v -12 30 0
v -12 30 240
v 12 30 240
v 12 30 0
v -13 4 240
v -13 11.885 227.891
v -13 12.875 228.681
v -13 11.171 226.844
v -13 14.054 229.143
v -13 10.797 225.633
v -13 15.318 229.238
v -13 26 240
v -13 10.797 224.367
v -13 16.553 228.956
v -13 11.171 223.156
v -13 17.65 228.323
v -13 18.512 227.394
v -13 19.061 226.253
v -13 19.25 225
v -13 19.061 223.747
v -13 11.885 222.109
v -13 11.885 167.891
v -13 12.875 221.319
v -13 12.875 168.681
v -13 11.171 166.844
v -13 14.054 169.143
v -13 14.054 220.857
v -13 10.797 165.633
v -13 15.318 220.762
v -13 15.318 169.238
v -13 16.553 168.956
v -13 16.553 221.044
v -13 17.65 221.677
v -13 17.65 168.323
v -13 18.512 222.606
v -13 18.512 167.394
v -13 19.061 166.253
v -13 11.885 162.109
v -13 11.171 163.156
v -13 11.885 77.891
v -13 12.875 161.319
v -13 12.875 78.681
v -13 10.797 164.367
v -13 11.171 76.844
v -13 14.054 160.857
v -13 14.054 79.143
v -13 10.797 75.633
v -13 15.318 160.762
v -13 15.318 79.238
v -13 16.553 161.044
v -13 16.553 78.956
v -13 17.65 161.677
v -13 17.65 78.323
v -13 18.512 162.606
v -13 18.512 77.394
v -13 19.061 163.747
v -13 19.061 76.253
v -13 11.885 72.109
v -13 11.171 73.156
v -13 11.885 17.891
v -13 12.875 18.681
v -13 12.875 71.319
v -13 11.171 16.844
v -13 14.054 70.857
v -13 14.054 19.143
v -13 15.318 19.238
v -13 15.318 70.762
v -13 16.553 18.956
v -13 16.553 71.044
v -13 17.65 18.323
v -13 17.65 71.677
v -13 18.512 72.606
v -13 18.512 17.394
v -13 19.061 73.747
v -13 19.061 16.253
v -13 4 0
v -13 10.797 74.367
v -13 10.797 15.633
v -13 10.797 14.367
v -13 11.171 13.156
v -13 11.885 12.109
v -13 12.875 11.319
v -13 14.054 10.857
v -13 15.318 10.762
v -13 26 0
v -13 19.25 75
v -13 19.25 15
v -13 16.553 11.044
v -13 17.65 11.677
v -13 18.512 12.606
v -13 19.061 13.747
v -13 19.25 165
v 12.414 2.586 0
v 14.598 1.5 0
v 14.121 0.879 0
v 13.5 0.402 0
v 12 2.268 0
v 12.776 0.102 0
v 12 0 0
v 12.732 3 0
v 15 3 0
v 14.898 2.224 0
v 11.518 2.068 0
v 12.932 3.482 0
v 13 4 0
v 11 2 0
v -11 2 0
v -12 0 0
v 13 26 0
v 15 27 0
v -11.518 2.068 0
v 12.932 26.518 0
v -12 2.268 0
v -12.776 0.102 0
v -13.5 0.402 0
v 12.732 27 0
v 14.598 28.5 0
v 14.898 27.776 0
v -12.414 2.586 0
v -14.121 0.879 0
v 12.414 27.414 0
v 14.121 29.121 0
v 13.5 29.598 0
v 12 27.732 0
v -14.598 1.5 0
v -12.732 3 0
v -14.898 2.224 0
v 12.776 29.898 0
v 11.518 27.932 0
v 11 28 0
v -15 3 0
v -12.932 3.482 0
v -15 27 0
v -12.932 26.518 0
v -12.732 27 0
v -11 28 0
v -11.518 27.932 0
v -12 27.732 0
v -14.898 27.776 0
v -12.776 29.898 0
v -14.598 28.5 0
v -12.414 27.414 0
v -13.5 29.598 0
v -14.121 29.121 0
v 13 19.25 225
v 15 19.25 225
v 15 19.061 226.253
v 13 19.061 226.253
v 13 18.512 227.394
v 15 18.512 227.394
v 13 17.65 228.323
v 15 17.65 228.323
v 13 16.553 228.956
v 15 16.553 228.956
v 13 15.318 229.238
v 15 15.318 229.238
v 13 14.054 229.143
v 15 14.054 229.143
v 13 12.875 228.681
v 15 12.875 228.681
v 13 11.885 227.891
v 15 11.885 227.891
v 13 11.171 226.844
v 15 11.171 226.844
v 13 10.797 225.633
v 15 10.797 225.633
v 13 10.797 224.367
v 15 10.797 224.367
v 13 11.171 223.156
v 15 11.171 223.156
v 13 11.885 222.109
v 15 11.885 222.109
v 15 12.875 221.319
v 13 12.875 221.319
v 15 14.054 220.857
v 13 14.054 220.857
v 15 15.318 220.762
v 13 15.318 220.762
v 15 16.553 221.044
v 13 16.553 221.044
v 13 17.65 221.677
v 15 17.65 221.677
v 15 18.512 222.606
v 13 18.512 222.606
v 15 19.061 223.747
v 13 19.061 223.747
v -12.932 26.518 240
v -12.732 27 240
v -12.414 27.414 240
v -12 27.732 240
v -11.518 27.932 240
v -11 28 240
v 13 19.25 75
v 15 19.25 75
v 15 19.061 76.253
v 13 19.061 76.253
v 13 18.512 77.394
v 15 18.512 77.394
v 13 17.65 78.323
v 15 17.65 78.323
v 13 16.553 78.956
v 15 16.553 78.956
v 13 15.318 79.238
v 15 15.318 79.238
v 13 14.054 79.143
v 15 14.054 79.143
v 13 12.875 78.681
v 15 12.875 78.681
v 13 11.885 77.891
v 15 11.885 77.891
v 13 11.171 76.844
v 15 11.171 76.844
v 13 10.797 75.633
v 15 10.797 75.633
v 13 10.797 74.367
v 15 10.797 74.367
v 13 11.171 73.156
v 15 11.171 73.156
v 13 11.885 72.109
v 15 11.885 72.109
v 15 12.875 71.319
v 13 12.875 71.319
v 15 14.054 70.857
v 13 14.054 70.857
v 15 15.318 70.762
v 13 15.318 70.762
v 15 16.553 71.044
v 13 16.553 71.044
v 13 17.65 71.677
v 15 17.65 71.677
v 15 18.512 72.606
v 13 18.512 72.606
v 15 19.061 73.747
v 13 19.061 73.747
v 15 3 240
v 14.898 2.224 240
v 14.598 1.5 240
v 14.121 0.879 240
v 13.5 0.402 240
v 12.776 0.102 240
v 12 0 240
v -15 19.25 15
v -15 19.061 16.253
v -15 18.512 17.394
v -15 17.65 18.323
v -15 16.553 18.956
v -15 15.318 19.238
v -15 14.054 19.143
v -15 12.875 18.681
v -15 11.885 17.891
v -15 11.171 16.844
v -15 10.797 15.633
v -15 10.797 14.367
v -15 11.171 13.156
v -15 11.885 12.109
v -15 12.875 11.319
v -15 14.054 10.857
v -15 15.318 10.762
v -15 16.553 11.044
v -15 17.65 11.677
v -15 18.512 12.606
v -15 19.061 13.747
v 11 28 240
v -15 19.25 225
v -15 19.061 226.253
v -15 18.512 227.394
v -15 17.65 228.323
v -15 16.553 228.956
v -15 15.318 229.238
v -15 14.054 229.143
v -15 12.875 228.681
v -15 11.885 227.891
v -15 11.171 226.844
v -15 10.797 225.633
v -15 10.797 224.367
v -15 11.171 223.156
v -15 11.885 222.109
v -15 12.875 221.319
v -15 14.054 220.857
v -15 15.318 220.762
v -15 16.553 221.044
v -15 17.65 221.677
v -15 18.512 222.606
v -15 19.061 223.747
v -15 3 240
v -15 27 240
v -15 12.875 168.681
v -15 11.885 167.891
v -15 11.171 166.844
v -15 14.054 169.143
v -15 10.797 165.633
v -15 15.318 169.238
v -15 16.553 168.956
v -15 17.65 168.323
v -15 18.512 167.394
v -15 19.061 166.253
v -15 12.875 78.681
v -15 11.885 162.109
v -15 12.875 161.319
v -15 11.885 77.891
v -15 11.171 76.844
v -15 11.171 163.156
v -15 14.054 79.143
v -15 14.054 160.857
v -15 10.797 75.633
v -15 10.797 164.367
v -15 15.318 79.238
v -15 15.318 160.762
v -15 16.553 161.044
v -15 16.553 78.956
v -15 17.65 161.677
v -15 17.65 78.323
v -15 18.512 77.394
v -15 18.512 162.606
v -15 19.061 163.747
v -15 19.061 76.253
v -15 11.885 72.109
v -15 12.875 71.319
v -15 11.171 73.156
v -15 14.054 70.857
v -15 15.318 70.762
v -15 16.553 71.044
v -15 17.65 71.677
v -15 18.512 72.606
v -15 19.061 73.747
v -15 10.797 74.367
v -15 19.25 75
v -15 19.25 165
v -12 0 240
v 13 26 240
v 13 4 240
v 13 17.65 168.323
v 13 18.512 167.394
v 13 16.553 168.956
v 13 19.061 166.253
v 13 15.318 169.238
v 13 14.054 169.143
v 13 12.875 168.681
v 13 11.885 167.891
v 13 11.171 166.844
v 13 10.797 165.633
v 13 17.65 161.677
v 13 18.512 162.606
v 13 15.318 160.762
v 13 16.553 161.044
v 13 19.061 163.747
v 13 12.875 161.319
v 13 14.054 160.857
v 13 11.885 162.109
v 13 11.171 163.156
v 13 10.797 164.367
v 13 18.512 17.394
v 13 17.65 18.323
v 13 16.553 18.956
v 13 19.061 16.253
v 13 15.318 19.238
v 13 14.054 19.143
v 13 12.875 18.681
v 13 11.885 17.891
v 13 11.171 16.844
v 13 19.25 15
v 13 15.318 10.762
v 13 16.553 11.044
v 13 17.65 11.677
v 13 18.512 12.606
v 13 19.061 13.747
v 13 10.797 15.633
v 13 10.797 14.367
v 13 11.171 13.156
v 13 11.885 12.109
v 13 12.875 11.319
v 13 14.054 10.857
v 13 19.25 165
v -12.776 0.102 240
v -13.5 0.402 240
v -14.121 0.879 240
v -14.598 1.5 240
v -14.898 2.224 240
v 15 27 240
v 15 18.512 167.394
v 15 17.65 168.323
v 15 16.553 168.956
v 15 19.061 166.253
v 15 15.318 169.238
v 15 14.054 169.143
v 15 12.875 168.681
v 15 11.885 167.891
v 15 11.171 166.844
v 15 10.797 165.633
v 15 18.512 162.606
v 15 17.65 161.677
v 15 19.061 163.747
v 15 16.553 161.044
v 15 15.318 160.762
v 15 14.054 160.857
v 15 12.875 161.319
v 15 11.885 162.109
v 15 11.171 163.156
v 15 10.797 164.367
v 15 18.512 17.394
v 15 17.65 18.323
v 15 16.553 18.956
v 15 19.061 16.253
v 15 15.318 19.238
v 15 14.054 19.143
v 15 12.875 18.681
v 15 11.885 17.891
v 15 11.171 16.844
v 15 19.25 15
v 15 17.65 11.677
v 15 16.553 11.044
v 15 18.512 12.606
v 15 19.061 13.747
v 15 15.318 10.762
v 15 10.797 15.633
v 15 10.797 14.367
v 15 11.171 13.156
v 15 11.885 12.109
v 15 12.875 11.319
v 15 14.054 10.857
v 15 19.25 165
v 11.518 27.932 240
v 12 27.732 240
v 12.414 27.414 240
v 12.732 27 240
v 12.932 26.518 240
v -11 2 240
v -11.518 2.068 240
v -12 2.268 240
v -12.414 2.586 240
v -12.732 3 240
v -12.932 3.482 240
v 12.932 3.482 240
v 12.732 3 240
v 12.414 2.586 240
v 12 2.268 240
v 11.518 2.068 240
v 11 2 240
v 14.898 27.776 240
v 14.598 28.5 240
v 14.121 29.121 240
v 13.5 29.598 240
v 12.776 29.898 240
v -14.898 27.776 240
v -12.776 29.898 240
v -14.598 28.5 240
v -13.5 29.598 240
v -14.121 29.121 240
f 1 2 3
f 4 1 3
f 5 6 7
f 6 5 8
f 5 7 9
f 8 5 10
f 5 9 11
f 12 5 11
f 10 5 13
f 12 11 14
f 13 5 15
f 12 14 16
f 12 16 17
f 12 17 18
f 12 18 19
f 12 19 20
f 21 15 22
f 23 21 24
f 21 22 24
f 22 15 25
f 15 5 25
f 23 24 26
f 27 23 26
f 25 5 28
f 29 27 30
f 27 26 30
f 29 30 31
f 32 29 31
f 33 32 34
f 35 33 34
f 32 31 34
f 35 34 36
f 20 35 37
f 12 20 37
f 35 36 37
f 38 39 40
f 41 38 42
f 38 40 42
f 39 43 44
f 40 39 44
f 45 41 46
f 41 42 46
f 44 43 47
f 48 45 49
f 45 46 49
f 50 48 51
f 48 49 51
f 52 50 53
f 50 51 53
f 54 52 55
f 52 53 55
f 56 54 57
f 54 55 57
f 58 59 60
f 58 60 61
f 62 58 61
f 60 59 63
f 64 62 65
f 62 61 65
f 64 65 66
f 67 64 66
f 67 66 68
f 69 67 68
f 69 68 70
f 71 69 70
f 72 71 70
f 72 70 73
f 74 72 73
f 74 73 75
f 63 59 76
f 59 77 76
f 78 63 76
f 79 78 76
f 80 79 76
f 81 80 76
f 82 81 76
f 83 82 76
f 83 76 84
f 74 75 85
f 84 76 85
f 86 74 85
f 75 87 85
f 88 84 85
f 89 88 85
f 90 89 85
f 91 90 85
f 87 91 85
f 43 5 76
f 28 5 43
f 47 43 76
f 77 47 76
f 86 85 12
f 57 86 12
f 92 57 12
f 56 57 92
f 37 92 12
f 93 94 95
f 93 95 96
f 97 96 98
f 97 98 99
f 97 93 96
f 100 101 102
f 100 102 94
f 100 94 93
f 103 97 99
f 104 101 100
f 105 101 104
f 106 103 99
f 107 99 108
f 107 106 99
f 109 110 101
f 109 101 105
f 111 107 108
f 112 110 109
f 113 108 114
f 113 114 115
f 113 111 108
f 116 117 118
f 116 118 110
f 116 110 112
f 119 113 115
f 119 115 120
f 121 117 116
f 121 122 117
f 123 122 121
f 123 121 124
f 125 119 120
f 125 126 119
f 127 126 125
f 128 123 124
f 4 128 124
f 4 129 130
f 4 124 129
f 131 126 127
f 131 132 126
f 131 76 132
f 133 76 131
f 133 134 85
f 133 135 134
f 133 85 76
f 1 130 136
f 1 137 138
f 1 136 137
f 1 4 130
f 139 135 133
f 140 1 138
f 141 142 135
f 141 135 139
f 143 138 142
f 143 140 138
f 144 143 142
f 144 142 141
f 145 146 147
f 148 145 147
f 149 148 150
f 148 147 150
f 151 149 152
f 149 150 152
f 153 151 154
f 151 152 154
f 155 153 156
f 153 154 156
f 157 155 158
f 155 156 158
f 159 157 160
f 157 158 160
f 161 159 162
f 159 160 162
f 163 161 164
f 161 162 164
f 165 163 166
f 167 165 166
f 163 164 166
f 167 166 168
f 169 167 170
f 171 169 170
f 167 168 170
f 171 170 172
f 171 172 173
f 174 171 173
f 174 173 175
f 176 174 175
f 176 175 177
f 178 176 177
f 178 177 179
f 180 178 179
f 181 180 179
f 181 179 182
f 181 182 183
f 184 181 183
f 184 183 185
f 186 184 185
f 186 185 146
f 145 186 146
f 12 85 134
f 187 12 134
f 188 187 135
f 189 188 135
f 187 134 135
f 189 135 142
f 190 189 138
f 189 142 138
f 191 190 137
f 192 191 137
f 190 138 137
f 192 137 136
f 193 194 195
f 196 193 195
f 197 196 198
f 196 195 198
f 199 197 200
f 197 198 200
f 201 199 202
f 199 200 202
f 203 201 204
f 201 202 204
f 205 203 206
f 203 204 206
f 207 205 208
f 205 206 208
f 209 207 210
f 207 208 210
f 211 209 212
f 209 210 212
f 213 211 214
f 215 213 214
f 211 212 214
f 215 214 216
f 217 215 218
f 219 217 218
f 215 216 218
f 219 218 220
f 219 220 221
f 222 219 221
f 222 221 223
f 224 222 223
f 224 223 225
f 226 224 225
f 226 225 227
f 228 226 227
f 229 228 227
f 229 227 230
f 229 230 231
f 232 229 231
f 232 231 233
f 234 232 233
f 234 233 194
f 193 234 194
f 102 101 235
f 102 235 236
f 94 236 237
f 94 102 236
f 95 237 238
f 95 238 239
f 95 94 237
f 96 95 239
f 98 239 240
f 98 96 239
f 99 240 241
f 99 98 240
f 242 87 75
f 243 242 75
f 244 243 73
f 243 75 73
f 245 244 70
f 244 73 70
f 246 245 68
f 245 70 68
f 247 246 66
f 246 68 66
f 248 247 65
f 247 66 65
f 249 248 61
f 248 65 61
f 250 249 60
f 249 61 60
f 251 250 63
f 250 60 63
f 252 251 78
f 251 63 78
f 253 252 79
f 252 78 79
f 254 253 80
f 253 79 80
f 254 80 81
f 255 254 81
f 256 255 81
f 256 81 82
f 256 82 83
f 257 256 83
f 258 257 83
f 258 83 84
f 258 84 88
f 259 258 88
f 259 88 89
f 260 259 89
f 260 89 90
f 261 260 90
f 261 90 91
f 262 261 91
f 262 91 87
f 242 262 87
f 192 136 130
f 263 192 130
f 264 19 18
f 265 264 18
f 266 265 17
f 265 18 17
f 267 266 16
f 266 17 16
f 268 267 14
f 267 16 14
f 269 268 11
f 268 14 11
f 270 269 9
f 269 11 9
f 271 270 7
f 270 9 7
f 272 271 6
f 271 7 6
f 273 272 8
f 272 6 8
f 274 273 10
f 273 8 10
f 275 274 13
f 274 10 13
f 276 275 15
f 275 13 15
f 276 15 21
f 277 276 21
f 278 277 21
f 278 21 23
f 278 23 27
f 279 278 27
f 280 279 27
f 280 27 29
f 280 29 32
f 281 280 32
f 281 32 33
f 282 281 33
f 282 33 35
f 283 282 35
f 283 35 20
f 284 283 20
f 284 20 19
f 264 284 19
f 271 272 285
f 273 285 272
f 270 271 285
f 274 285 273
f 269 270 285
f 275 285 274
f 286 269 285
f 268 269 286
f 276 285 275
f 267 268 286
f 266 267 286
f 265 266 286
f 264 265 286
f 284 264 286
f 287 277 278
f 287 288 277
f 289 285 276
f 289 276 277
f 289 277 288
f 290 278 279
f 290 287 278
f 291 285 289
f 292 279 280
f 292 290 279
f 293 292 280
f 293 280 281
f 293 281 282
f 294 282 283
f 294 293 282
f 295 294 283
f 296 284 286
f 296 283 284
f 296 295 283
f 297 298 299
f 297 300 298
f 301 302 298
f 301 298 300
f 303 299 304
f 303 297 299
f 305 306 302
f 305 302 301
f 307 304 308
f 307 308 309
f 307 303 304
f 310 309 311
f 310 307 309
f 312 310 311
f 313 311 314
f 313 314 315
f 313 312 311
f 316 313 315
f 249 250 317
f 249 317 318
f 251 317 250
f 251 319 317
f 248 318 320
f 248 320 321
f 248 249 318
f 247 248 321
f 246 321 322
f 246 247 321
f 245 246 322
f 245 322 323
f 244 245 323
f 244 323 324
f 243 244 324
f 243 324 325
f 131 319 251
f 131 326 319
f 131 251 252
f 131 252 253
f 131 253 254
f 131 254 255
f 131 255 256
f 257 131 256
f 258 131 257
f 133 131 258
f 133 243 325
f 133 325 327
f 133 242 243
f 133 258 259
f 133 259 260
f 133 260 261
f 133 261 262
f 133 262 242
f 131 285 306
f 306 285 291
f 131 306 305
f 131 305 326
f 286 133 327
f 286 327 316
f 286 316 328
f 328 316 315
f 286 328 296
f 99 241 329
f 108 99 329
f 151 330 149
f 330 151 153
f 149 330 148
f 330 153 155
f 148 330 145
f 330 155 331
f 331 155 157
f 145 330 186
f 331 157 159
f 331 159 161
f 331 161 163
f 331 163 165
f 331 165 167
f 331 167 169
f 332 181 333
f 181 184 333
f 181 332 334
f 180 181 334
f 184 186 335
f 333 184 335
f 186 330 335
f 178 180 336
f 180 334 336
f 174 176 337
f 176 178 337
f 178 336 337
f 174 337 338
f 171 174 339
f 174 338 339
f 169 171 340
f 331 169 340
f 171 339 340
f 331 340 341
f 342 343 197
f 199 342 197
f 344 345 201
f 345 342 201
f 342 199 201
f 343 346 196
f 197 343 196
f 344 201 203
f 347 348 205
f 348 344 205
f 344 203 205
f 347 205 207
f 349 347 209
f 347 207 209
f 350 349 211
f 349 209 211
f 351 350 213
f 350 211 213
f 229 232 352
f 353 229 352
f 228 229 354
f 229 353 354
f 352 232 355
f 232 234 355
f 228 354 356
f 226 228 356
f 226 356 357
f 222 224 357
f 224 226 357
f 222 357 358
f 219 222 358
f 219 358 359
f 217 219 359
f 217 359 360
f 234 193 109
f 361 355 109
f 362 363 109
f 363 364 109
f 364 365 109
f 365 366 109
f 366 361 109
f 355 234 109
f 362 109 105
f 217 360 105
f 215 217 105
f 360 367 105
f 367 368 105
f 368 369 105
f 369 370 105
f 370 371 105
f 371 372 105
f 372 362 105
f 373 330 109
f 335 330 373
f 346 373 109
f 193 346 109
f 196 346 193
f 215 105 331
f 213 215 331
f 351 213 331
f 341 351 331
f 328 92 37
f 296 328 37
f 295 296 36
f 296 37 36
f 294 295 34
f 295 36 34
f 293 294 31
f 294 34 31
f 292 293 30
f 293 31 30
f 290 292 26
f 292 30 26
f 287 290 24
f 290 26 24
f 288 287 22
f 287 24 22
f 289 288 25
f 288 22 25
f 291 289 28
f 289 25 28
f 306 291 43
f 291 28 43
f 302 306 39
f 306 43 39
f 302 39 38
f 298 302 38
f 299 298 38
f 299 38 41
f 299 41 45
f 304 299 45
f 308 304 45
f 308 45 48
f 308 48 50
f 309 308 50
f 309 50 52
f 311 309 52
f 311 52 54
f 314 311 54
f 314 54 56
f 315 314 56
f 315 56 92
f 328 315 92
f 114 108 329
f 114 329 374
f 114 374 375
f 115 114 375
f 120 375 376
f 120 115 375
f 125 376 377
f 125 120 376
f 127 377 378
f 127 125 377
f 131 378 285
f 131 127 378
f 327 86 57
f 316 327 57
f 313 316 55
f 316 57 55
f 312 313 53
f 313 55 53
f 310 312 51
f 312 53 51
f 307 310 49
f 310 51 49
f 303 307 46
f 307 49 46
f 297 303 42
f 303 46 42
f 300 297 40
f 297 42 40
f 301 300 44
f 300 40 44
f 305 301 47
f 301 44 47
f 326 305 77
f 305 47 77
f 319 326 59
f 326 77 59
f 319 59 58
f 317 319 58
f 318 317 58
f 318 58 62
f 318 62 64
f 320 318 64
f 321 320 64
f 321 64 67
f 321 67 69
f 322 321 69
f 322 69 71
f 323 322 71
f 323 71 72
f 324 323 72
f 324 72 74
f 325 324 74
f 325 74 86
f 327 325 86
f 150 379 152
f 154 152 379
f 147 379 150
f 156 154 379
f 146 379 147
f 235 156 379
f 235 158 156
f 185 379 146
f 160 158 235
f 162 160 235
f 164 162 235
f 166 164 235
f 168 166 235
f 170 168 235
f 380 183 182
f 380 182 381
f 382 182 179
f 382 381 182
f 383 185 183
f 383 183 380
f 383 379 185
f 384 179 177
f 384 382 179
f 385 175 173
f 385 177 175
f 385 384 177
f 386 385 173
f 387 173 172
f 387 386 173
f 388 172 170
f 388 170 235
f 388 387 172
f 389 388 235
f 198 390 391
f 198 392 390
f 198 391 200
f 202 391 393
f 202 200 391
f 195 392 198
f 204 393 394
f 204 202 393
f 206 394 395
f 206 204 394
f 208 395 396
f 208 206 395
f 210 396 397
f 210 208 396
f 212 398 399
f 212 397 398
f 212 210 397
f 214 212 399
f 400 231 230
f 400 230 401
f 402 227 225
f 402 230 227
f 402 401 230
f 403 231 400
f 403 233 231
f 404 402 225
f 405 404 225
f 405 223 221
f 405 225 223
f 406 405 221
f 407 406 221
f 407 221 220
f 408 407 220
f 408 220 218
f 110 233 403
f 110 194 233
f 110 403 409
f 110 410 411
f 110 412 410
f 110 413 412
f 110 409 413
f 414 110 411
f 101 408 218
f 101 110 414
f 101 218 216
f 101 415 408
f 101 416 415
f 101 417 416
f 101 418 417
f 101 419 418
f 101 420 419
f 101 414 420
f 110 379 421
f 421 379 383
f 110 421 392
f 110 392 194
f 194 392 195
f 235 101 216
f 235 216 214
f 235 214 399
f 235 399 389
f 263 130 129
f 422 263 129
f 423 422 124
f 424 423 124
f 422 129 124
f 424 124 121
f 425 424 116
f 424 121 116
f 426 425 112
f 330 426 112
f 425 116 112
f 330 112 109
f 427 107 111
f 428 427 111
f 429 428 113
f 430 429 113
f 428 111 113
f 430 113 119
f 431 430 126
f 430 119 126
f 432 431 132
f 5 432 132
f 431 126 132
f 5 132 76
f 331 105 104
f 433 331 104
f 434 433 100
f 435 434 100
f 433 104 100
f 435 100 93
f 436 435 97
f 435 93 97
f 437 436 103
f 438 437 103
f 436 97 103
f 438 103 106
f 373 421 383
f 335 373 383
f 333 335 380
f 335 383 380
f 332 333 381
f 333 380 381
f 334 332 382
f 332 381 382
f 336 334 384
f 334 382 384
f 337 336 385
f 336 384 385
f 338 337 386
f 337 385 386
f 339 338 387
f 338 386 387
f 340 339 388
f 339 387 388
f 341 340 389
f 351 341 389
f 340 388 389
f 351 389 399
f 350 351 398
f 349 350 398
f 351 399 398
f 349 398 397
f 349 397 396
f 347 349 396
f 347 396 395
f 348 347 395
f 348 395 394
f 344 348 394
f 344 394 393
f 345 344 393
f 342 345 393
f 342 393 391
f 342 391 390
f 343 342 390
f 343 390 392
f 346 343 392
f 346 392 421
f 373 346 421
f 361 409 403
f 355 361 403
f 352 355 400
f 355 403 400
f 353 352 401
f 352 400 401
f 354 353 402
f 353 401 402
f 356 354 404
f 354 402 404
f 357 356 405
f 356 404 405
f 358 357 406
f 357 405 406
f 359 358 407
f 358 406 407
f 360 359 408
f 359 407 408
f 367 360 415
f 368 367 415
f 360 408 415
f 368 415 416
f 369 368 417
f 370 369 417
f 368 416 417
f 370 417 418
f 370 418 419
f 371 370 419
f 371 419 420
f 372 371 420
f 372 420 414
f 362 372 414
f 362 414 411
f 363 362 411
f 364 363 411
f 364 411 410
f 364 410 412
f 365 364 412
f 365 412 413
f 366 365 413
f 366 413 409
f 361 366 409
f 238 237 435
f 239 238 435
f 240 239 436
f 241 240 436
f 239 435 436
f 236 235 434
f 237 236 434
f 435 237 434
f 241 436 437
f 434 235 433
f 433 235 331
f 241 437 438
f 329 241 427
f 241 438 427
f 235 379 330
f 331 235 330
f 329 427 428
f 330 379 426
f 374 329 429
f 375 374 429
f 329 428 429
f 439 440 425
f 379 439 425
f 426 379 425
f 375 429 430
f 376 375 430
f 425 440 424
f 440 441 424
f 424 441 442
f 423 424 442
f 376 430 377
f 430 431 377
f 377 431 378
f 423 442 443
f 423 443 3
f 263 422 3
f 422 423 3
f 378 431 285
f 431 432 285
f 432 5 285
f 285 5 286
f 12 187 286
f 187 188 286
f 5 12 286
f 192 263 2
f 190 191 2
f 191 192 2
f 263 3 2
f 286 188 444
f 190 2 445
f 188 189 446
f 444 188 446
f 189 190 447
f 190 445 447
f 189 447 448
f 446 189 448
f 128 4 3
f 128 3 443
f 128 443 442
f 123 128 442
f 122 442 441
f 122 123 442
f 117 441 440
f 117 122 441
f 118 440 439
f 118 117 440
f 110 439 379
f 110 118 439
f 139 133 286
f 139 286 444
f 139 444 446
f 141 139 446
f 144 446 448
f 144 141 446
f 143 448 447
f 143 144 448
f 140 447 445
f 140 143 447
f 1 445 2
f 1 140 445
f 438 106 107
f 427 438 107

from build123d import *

# Parameters (mm, degrees)
EXTRUDE_1_DEPTH     = 240
SKETCH_2_R          = 4.25
CUT_EXTRUDE_1_DEPTH = 244.721152139


with BuildPart() as part:
    # Эскиз1 → Бобышка-Вытянуть1 (new body)
    with BuildSketch(Plane.XY):
        with BuildLine():
            Line((-12, 30), (12, 30))
            ThreePointArc((12, 30), (14.121320344, 29.121320344), (15, 27))
            Line((15, 27), (15, 3))
            ThreePointArc((15, 3), (14.121320344, 0.878679656), (12, 0))
            Line((12, 0), (-12, 0))
            ThreePointArc((-12, 0), (-14.121320344, 0.878679656), (-15, 3))
            Line((-15, 3), (-15, 27))
            ThreePointArc((-15, 27), (-14.121320344, 29.121320344), (-12, 30))
        make_face()
        with BuildLine():
            Line((-11, 28), (11, 28))
            ThreePointArc((11, 28), (12.414213562, 27.414213562), (13, 26))
            Line((13, 26), (13, 4))
            ThreePointArc((13, 4), (12.414213562, 2.585786438), (11, 2))
            Line((11, 2), (-11, 2))
            ThreePointArc((-11, 2), (-12.414213562, 2.585786438), (-13, 4))
            Line((-13, 4), (-13, 26))
            ThreePointArc((-13, 26), (-12.414213562, 27.414213562), (-11, 28))
        make_face(mode=Mode.SUBTRACT)
    extrude(amount=EXTRUDE_1_DEPTH)

    # Эскиз2 → Вырез-Вытянуть1 (cut, through all)
    with BuildSketch(Plane(origin=(15, 0, 0), x_dir=(0, 0, -1), z_dir=(1, 0, 0))):
        with Locations(Location((-225, 15, 0), (0, 0, 90))):
            Circle(SKETCH_2_R)
        with Locations(Location((-165, 15, 0), (0, 0, 90))):
            Circle(SKETCH_2_R)
        with Locations(Location((-75, 15, 0), (0, 0, 90))):
            Circle(SKETCH_2_R)
        with Locations(Location((-15, 15, 0), (0, 0, 90))):
            Circle(SKETCH_2_R)
    extrude(amount=-CUT_EXTRUDE_1_DEPTH, mode=Mode.SUBTRACT)


solid = part.part
